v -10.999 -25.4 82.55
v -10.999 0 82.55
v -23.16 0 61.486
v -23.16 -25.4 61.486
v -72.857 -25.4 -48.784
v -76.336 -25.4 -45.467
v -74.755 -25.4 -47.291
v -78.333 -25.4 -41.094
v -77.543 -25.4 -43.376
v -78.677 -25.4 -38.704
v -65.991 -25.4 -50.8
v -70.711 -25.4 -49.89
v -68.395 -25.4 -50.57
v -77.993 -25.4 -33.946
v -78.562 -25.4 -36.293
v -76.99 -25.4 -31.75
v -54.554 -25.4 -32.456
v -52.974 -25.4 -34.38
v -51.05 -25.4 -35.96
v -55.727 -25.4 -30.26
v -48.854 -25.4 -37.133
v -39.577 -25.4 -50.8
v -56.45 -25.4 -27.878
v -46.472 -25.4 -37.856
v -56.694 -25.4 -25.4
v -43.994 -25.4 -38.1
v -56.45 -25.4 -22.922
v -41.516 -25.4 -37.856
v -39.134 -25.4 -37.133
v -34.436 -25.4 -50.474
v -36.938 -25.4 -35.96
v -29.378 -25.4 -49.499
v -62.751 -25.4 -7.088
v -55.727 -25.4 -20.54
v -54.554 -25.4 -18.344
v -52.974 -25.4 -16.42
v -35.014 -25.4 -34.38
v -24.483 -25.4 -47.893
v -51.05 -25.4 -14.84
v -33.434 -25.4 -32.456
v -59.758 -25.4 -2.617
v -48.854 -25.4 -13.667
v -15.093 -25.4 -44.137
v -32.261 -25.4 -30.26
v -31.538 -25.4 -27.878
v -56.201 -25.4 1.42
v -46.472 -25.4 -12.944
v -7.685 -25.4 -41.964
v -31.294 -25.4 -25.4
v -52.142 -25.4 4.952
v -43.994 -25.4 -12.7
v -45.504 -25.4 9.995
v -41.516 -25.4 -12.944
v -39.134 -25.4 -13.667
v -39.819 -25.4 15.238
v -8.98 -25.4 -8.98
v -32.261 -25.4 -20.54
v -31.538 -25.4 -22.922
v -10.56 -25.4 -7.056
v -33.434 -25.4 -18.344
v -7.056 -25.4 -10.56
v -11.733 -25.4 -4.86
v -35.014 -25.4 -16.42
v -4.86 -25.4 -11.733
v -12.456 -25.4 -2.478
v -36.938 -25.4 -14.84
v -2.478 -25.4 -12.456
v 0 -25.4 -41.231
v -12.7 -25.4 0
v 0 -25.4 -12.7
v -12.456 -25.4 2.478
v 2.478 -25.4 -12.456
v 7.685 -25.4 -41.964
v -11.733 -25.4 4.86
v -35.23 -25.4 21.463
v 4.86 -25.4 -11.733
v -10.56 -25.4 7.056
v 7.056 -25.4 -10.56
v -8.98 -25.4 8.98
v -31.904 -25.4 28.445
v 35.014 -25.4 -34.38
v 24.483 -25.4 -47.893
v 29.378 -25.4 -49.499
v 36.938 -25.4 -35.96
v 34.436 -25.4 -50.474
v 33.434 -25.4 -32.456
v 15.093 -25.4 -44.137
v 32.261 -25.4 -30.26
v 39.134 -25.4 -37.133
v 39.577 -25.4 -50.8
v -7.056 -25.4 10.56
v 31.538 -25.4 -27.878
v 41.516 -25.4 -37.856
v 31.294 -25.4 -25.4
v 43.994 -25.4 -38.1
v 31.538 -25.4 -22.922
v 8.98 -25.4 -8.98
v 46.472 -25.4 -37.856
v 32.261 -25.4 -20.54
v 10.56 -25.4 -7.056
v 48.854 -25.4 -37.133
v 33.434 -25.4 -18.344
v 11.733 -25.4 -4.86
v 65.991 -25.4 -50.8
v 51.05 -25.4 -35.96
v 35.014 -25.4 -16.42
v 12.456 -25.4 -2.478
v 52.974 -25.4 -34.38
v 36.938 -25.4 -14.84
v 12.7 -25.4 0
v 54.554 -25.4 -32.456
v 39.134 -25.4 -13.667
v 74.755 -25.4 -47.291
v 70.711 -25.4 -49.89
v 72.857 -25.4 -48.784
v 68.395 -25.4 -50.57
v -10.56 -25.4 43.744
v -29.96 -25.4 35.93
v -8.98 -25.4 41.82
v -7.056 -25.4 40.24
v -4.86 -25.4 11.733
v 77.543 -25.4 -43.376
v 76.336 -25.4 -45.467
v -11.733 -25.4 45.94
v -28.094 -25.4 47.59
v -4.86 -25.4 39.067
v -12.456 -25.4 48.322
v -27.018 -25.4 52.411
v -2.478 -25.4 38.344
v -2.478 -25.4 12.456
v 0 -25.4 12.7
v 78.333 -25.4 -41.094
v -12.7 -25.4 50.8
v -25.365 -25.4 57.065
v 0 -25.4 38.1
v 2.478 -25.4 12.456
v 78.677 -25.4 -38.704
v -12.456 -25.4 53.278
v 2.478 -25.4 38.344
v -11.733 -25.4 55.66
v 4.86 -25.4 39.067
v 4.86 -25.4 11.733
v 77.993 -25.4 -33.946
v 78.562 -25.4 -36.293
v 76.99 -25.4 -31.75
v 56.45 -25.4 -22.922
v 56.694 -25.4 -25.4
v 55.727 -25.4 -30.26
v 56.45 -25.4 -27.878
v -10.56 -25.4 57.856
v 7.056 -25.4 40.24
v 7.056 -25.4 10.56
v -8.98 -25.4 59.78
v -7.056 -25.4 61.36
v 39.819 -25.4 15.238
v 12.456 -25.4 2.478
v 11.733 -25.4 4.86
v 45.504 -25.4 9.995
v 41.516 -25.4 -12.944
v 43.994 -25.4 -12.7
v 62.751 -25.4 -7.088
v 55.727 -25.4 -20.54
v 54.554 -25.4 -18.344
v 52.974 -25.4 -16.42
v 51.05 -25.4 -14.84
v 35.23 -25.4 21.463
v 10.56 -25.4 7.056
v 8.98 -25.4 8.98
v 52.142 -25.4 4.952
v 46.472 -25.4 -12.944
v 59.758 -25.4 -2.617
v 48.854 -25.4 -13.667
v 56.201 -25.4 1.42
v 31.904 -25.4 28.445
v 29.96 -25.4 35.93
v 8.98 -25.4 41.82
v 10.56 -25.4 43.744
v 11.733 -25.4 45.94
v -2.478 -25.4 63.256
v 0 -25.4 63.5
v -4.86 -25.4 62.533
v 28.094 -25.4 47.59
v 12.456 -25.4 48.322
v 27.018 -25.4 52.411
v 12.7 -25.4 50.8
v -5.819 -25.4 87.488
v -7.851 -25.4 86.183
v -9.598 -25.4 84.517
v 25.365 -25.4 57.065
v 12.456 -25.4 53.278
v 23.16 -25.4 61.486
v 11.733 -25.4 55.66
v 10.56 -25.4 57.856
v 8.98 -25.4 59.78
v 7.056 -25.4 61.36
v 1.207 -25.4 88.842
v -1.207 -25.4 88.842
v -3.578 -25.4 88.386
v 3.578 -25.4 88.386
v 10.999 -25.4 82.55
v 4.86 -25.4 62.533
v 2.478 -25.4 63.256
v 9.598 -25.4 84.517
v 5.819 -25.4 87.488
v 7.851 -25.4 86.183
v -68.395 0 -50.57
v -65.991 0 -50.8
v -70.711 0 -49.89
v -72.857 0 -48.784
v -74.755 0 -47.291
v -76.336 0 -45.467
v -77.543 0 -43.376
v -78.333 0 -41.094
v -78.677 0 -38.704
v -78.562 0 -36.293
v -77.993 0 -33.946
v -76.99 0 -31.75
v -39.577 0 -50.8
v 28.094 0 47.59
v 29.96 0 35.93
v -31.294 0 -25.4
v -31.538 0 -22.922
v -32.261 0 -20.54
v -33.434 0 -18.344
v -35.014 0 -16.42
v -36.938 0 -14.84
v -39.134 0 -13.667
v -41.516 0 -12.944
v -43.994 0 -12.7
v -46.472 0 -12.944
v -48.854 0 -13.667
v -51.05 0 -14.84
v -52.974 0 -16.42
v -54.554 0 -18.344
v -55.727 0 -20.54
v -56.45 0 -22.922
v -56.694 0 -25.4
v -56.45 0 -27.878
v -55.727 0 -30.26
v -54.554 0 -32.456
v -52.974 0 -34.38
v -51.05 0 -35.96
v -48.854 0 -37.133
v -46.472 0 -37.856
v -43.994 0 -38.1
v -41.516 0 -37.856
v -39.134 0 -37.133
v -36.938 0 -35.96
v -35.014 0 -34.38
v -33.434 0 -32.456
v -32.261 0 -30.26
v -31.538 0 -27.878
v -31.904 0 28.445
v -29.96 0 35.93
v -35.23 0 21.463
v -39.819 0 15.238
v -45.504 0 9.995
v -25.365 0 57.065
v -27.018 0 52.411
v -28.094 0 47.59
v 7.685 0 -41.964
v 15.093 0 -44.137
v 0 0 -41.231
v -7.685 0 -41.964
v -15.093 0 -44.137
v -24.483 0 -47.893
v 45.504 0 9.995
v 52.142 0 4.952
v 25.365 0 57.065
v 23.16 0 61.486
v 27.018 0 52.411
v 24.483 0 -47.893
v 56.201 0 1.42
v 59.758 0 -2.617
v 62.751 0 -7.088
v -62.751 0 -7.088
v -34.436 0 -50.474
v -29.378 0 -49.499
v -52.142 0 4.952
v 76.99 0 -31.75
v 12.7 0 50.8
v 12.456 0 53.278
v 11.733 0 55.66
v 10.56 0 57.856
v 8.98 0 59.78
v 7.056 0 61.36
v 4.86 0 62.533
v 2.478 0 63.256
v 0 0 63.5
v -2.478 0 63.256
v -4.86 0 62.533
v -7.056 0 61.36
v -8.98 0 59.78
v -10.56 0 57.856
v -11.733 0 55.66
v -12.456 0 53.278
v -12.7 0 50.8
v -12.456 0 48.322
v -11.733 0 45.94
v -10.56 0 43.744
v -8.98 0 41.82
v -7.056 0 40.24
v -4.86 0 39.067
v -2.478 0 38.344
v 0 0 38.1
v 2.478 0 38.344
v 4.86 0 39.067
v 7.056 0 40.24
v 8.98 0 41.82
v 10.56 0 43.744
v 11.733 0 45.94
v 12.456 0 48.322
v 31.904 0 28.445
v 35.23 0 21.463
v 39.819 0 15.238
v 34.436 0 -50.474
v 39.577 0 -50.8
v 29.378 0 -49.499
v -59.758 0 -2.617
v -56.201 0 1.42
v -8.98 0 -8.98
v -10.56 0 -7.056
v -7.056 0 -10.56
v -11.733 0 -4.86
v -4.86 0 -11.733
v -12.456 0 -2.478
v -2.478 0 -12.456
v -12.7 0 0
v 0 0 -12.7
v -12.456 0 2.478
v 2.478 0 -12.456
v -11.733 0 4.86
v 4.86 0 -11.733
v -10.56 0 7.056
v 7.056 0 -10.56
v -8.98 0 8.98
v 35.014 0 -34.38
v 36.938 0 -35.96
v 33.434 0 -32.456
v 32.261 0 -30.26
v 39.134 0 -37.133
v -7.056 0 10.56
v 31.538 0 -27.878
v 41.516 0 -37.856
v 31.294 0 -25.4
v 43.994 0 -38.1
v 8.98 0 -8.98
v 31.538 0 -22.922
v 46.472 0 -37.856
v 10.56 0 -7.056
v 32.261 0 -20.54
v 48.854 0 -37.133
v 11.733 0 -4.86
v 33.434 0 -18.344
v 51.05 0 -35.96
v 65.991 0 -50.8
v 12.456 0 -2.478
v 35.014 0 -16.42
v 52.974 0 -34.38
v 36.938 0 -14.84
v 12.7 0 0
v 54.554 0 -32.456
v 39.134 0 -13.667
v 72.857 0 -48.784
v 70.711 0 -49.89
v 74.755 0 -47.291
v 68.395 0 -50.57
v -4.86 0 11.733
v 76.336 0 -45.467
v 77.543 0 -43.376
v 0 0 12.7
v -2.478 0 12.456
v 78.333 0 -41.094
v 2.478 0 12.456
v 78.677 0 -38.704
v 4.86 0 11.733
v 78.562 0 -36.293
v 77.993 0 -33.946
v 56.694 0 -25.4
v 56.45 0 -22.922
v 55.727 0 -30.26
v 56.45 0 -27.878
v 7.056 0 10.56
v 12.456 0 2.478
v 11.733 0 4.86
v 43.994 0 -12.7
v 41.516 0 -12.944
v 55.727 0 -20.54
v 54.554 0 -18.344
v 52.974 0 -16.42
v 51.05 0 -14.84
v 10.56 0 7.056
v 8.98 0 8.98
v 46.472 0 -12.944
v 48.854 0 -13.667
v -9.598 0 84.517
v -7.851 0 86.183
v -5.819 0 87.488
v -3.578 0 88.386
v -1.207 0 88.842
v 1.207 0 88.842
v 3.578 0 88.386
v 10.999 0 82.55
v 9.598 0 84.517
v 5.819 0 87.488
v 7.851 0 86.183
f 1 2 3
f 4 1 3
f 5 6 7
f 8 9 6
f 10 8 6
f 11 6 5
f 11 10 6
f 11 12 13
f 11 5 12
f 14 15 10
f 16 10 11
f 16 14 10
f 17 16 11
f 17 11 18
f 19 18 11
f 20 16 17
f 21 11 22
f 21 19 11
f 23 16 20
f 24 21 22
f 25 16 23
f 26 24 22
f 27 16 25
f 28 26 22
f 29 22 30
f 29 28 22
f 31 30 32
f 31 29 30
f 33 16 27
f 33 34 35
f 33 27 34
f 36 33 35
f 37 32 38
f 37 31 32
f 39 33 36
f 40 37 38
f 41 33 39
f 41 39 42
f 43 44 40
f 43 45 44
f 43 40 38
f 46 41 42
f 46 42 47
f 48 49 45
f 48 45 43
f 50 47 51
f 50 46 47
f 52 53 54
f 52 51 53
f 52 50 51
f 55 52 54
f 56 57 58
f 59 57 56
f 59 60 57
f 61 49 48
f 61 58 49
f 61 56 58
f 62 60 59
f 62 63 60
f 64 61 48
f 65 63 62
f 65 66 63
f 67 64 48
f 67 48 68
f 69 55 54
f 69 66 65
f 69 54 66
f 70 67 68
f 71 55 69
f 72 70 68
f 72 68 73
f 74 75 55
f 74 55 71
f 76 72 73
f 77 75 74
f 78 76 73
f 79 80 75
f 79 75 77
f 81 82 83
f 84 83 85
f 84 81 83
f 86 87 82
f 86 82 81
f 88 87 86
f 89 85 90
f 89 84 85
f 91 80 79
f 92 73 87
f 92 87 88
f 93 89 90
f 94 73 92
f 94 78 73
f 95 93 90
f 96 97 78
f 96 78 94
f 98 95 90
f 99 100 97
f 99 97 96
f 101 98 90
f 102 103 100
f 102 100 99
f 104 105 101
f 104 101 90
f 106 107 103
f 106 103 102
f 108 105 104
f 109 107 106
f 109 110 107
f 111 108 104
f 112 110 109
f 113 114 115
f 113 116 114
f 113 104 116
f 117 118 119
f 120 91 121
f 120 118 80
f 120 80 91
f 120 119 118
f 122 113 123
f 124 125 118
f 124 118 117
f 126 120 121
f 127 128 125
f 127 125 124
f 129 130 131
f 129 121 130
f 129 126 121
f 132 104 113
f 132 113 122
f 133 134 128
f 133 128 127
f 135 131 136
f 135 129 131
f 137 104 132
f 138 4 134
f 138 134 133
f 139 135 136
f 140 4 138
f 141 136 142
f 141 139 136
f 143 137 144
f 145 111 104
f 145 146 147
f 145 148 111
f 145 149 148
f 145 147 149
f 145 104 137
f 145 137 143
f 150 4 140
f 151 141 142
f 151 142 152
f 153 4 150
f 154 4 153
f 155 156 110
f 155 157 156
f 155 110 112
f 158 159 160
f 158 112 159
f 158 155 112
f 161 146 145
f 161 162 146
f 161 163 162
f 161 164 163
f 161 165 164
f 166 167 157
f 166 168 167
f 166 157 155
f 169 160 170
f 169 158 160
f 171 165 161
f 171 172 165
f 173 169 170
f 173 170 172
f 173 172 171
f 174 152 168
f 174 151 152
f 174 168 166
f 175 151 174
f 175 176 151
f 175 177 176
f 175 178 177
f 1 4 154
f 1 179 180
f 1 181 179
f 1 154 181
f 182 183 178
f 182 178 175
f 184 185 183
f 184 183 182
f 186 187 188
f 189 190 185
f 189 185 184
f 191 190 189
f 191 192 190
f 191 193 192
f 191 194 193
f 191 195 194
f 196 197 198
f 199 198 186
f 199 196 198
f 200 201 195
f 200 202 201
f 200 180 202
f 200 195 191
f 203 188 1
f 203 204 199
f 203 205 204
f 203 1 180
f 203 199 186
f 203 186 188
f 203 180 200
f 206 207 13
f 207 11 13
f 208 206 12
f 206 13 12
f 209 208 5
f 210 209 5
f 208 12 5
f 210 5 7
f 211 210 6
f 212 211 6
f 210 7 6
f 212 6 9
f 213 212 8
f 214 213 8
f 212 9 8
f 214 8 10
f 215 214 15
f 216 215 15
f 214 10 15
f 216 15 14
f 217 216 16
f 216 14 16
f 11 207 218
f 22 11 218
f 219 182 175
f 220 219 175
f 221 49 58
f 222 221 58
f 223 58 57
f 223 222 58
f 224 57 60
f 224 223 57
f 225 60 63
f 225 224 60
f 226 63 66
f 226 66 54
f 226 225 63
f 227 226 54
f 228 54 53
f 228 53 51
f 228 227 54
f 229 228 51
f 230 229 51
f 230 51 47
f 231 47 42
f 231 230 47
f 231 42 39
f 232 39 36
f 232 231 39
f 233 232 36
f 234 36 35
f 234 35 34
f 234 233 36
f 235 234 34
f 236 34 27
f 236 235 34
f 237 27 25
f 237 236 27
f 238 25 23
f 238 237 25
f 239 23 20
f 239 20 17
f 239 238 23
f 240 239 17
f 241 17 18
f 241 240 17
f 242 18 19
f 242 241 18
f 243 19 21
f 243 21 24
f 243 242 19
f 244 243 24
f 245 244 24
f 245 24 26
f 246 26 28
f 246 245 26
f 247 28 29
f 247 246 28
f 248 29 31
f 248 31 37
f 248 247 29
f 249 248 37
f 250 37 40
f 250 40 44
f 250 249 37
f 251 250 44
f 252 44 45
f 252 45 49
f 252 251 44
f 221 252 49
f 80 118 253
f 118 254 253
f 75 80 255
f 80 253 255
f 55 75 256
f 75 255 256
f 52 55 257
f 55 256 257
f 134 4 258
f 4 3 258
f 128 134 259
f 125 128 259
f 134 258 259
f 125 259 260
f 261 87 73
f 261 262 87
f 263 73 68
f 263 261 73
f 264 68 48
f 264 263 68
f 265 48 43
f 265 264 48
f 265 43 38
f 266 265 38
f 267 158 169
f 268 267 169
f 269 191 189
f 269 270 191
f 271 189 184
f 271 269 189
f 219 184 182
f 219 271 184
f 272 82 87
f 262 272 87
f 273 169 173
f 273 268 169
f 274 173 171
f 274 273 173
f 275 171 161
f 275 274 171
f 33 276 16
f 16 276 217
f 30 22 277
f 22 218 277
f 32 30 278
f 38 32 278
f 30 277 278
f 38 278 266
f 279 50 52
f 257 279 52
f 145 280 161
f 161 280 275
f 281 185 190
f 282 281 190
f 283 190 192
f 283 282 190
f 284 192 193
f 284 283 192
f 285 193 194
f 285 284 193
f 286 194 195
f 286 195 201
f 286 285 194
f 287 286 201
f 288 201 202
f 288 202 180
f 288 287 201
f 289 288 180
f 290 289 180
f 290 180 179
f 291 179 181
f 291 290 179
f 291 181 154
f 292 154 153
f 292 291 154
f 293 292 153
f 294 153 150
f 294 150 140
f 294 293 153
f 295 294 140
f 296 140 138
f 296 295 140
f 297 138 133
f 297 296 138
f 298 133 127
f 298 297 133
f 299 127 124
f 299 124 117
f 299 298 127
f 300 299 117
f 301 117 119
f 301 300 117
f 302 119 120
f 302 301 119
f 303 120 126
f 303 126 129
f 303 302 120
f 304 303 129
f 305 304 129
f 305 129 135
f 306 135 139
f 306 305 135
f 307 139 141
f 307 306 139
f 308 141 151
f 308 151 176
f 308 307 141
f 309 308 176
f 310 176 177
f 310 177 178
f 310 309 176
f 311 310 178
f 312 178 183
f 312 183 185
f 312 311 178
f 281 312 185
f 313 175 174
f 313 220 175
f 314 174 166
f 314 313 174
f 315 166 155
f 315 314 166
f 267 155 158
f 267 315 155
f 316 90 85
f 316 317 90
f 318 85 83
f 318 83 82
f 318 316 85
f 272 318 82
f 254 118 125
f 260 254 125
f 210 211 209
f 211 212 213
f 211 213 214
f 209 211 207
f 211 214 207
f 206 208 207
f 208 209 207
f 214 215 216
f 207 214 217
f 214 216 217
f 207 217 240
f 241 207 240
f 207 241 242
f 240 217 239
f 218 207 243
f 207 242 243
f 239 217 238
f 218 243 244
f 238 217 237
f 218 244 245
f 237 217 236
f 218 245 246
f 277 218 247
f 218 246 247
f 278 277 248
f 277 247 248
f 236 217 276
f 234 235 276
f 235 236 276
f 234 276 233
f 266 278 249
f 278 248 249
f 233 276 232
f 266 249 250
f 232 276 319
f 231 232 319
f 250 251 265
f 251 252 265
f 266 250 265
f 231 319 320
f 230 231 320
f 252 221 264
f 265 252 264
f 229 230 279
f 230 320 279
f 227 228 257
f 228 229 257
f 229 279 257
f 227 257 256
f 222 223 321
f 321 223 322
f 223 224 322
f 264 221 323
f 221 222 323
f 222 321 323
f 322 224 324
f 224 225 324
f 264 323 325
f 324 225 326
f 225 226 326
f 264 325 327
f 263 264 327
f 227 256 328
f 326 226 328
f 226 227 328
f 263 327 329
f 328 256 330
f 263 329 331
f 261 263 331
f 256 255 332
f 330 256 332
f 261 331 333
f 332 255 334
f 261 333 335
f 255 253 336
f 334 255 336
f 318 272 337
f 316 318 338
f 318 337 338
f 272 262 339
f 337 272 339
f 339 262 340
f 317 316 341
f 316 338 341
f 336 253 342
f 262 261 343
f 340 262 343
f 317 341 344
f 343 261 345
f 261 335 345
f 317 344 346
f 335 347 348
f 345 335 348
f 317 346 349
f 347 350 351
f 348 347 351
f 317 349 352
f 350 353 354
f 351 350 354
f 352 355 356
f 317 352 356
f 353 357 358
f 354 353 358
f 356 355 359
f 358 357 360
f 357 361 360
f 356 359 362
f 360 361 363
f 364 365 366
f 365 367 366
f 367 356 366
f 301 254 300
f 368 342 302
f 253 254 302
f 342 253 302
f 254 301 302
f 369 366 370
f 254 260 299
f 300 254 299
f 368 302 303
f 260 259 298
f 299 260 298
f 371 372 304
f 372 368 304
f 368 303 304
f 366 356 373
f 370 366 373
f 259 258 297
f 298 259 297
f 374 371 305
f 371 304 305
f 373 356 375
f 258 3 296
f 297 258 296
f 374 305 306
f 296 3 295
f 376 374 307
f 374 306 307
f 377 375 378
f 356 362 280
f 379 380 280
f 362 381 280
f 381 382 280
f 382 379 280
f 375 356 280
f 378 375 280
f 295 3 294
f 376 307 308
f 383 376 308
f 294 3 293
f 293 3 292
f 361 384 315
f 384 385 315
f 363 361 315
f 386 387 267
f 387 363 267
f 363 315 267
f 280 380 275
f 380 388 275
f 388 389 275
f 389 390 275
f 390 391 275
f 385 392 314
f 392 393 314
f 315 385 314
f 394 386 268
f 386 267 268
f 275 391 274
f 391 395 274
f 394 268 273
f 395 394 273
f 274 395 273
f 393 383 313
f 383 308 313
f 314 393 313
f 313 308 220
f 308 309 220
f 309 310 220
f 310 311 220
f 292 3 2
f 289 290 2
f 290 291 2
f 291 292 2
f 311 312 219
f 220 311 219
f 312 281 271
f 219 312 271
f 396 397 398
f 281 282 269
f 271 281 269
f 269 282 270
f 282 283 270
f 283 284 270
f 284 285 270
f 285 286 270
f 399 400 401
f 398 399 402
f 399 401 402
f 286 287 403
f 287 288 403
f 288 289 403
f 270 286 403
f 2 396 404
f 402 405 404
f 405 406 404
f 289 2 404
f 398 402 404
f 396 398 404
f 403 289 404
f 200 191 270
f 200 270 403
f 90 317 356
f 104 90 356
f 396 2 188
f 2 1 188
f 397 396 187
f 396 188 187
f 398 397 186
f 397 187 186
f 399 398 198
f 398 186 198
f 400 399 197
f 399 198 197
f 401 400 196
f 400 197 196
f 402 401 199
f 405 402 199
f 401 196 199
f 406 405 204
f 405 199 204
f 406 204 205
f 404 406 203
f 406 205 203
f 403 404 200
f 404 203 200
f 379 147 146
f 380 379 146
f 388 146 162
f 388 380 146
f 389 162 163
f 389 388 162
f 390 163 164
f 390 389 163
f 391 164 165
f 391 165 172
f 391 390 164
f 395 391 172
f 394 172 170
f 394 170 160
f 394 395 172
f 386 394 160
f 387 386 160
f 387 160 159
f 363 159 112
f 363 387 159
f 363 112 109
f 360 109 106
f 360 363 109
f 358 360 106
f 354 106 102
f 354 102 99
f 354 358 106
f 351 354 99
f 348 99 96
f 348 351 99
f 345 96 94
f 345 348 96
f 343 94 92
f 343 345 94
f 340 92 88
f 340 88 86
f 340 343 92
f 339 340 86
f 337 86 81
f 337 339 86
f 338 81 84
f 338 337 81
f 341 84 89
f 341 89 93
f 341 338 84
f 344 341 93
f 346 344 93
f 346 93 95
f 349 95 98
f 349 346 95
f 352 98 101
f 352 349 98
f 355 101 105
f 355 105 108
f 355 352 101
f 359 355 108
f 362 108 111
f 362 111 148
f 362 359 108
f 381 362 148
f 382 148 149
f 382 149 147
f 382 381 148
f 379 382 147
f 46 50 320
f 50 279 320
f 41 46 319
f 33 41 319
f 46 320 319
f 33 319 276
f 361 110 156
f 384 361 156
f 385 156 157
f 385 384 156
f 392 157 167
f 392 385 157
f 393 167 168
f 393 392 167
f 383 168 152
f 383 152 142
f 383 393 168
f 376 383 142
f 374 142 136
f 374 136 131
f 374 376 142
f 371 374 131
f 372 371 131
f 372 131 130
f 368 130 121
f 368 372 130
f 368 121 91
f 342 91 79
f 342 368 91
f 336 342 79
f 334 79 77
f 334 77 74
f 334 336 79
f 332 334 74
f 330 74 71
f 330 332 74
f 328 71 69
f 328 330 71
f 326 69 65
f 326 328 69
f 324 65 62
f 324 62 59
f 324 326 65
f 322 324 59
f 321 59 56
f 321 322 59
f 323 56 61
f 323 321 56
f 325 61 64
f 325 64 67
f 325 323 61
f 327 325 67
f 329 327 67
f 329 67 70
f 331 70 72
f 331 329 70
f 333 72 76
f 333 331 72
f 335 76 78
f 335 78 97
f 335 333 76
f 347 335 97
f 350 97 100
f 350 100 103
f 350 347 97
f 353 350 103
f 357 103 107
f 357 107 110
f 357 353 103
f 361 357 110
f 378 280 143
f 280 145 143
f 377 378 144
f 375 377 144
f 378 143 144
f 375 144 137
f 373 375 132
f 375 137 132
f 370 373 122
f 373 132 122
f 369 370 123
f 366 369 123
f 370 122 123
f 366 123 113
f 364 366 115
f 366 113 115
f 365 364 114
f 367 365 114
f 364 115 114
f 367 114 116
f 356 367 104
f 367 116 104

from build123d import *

# Parameters (mm, degrees)
F0_R     = 12.7
F1_DEPTH = 25.4
F3_DEPTH = 25.4
F4_R     = 12.7
F5_R     = 40.64


with BuildPart() as f1:
    # F0 (on Front) → F1 (new body)
    with BuildSketch(Plane.XZ):
        Polygon((0, 101.6), (-87.9881810245, -50.8), (87.9881810245, -50.8), align=None)
        with Locations((-43.9940905122, -25.4)):
            Circle(F0_R, mode=Mode.SUBTRACT)
        Circle(F0_R, mode=Mode.SUBTRACT)
        with Locations((43.9940905122, -25.4)):
            Circle(F0_R, mode=Mode.SUBTRACT)
        with Locations((0, 50.8)):
            Circle(F0_R, mode=Mode.SUBTRACT)
    extrude(amount=F1_DEPTH)

    # F2 (on face) → F3 (cut)
    with BuildSketch(Plane.XZ.offset(25.4)):
        Polygon((-32.5348633552, 19.8479636515), (-26.9087873497, 54.9926131403), (-58.6587873497, 0), align=None)
        Polygon((58.6587873497, 0), (26.9087873497, 54.9926131403), (32.5348633552, 19.8479636515), align=None)
        Polygon((0, -38.1), (-31.75, -50.8), (31.75, -50.8), align=None)
    extrude(amount=-F3_DEPTH, mode=Mode.SUBTRACT)

    # F4
    f4_edges = [f1.edges().sort_by_distance(p)[0] for p in [
        (0, -12.7, 101.6),
        (-87.988181, -12.7, -50.8),
        (87.988181, -12.7, -50.8),
    ]]
    fillet(f4_edges, radius=F4_R)

    # F5
    f5_edges = [f1.edges().sort_by_distance(p)[0] for p in [
        (-26.908787, -12.7, 54.992613),
        (-32.534863, -12.7, 19.847964),
        (-58.658787, -12.7, 0),
        (26.908787, -12.7, 54.992613),
        (32.534863, -12.7, 19.847964),
        (58.658787, -12.7, 0),
        (31.75, -12.7, -50.8),
        (0, -12.7, -38.1),
        (-31.75, -12.7, -50.8),
    ]]
    fillet(f5_edges, radius=F5_R)


solid = f1.part
